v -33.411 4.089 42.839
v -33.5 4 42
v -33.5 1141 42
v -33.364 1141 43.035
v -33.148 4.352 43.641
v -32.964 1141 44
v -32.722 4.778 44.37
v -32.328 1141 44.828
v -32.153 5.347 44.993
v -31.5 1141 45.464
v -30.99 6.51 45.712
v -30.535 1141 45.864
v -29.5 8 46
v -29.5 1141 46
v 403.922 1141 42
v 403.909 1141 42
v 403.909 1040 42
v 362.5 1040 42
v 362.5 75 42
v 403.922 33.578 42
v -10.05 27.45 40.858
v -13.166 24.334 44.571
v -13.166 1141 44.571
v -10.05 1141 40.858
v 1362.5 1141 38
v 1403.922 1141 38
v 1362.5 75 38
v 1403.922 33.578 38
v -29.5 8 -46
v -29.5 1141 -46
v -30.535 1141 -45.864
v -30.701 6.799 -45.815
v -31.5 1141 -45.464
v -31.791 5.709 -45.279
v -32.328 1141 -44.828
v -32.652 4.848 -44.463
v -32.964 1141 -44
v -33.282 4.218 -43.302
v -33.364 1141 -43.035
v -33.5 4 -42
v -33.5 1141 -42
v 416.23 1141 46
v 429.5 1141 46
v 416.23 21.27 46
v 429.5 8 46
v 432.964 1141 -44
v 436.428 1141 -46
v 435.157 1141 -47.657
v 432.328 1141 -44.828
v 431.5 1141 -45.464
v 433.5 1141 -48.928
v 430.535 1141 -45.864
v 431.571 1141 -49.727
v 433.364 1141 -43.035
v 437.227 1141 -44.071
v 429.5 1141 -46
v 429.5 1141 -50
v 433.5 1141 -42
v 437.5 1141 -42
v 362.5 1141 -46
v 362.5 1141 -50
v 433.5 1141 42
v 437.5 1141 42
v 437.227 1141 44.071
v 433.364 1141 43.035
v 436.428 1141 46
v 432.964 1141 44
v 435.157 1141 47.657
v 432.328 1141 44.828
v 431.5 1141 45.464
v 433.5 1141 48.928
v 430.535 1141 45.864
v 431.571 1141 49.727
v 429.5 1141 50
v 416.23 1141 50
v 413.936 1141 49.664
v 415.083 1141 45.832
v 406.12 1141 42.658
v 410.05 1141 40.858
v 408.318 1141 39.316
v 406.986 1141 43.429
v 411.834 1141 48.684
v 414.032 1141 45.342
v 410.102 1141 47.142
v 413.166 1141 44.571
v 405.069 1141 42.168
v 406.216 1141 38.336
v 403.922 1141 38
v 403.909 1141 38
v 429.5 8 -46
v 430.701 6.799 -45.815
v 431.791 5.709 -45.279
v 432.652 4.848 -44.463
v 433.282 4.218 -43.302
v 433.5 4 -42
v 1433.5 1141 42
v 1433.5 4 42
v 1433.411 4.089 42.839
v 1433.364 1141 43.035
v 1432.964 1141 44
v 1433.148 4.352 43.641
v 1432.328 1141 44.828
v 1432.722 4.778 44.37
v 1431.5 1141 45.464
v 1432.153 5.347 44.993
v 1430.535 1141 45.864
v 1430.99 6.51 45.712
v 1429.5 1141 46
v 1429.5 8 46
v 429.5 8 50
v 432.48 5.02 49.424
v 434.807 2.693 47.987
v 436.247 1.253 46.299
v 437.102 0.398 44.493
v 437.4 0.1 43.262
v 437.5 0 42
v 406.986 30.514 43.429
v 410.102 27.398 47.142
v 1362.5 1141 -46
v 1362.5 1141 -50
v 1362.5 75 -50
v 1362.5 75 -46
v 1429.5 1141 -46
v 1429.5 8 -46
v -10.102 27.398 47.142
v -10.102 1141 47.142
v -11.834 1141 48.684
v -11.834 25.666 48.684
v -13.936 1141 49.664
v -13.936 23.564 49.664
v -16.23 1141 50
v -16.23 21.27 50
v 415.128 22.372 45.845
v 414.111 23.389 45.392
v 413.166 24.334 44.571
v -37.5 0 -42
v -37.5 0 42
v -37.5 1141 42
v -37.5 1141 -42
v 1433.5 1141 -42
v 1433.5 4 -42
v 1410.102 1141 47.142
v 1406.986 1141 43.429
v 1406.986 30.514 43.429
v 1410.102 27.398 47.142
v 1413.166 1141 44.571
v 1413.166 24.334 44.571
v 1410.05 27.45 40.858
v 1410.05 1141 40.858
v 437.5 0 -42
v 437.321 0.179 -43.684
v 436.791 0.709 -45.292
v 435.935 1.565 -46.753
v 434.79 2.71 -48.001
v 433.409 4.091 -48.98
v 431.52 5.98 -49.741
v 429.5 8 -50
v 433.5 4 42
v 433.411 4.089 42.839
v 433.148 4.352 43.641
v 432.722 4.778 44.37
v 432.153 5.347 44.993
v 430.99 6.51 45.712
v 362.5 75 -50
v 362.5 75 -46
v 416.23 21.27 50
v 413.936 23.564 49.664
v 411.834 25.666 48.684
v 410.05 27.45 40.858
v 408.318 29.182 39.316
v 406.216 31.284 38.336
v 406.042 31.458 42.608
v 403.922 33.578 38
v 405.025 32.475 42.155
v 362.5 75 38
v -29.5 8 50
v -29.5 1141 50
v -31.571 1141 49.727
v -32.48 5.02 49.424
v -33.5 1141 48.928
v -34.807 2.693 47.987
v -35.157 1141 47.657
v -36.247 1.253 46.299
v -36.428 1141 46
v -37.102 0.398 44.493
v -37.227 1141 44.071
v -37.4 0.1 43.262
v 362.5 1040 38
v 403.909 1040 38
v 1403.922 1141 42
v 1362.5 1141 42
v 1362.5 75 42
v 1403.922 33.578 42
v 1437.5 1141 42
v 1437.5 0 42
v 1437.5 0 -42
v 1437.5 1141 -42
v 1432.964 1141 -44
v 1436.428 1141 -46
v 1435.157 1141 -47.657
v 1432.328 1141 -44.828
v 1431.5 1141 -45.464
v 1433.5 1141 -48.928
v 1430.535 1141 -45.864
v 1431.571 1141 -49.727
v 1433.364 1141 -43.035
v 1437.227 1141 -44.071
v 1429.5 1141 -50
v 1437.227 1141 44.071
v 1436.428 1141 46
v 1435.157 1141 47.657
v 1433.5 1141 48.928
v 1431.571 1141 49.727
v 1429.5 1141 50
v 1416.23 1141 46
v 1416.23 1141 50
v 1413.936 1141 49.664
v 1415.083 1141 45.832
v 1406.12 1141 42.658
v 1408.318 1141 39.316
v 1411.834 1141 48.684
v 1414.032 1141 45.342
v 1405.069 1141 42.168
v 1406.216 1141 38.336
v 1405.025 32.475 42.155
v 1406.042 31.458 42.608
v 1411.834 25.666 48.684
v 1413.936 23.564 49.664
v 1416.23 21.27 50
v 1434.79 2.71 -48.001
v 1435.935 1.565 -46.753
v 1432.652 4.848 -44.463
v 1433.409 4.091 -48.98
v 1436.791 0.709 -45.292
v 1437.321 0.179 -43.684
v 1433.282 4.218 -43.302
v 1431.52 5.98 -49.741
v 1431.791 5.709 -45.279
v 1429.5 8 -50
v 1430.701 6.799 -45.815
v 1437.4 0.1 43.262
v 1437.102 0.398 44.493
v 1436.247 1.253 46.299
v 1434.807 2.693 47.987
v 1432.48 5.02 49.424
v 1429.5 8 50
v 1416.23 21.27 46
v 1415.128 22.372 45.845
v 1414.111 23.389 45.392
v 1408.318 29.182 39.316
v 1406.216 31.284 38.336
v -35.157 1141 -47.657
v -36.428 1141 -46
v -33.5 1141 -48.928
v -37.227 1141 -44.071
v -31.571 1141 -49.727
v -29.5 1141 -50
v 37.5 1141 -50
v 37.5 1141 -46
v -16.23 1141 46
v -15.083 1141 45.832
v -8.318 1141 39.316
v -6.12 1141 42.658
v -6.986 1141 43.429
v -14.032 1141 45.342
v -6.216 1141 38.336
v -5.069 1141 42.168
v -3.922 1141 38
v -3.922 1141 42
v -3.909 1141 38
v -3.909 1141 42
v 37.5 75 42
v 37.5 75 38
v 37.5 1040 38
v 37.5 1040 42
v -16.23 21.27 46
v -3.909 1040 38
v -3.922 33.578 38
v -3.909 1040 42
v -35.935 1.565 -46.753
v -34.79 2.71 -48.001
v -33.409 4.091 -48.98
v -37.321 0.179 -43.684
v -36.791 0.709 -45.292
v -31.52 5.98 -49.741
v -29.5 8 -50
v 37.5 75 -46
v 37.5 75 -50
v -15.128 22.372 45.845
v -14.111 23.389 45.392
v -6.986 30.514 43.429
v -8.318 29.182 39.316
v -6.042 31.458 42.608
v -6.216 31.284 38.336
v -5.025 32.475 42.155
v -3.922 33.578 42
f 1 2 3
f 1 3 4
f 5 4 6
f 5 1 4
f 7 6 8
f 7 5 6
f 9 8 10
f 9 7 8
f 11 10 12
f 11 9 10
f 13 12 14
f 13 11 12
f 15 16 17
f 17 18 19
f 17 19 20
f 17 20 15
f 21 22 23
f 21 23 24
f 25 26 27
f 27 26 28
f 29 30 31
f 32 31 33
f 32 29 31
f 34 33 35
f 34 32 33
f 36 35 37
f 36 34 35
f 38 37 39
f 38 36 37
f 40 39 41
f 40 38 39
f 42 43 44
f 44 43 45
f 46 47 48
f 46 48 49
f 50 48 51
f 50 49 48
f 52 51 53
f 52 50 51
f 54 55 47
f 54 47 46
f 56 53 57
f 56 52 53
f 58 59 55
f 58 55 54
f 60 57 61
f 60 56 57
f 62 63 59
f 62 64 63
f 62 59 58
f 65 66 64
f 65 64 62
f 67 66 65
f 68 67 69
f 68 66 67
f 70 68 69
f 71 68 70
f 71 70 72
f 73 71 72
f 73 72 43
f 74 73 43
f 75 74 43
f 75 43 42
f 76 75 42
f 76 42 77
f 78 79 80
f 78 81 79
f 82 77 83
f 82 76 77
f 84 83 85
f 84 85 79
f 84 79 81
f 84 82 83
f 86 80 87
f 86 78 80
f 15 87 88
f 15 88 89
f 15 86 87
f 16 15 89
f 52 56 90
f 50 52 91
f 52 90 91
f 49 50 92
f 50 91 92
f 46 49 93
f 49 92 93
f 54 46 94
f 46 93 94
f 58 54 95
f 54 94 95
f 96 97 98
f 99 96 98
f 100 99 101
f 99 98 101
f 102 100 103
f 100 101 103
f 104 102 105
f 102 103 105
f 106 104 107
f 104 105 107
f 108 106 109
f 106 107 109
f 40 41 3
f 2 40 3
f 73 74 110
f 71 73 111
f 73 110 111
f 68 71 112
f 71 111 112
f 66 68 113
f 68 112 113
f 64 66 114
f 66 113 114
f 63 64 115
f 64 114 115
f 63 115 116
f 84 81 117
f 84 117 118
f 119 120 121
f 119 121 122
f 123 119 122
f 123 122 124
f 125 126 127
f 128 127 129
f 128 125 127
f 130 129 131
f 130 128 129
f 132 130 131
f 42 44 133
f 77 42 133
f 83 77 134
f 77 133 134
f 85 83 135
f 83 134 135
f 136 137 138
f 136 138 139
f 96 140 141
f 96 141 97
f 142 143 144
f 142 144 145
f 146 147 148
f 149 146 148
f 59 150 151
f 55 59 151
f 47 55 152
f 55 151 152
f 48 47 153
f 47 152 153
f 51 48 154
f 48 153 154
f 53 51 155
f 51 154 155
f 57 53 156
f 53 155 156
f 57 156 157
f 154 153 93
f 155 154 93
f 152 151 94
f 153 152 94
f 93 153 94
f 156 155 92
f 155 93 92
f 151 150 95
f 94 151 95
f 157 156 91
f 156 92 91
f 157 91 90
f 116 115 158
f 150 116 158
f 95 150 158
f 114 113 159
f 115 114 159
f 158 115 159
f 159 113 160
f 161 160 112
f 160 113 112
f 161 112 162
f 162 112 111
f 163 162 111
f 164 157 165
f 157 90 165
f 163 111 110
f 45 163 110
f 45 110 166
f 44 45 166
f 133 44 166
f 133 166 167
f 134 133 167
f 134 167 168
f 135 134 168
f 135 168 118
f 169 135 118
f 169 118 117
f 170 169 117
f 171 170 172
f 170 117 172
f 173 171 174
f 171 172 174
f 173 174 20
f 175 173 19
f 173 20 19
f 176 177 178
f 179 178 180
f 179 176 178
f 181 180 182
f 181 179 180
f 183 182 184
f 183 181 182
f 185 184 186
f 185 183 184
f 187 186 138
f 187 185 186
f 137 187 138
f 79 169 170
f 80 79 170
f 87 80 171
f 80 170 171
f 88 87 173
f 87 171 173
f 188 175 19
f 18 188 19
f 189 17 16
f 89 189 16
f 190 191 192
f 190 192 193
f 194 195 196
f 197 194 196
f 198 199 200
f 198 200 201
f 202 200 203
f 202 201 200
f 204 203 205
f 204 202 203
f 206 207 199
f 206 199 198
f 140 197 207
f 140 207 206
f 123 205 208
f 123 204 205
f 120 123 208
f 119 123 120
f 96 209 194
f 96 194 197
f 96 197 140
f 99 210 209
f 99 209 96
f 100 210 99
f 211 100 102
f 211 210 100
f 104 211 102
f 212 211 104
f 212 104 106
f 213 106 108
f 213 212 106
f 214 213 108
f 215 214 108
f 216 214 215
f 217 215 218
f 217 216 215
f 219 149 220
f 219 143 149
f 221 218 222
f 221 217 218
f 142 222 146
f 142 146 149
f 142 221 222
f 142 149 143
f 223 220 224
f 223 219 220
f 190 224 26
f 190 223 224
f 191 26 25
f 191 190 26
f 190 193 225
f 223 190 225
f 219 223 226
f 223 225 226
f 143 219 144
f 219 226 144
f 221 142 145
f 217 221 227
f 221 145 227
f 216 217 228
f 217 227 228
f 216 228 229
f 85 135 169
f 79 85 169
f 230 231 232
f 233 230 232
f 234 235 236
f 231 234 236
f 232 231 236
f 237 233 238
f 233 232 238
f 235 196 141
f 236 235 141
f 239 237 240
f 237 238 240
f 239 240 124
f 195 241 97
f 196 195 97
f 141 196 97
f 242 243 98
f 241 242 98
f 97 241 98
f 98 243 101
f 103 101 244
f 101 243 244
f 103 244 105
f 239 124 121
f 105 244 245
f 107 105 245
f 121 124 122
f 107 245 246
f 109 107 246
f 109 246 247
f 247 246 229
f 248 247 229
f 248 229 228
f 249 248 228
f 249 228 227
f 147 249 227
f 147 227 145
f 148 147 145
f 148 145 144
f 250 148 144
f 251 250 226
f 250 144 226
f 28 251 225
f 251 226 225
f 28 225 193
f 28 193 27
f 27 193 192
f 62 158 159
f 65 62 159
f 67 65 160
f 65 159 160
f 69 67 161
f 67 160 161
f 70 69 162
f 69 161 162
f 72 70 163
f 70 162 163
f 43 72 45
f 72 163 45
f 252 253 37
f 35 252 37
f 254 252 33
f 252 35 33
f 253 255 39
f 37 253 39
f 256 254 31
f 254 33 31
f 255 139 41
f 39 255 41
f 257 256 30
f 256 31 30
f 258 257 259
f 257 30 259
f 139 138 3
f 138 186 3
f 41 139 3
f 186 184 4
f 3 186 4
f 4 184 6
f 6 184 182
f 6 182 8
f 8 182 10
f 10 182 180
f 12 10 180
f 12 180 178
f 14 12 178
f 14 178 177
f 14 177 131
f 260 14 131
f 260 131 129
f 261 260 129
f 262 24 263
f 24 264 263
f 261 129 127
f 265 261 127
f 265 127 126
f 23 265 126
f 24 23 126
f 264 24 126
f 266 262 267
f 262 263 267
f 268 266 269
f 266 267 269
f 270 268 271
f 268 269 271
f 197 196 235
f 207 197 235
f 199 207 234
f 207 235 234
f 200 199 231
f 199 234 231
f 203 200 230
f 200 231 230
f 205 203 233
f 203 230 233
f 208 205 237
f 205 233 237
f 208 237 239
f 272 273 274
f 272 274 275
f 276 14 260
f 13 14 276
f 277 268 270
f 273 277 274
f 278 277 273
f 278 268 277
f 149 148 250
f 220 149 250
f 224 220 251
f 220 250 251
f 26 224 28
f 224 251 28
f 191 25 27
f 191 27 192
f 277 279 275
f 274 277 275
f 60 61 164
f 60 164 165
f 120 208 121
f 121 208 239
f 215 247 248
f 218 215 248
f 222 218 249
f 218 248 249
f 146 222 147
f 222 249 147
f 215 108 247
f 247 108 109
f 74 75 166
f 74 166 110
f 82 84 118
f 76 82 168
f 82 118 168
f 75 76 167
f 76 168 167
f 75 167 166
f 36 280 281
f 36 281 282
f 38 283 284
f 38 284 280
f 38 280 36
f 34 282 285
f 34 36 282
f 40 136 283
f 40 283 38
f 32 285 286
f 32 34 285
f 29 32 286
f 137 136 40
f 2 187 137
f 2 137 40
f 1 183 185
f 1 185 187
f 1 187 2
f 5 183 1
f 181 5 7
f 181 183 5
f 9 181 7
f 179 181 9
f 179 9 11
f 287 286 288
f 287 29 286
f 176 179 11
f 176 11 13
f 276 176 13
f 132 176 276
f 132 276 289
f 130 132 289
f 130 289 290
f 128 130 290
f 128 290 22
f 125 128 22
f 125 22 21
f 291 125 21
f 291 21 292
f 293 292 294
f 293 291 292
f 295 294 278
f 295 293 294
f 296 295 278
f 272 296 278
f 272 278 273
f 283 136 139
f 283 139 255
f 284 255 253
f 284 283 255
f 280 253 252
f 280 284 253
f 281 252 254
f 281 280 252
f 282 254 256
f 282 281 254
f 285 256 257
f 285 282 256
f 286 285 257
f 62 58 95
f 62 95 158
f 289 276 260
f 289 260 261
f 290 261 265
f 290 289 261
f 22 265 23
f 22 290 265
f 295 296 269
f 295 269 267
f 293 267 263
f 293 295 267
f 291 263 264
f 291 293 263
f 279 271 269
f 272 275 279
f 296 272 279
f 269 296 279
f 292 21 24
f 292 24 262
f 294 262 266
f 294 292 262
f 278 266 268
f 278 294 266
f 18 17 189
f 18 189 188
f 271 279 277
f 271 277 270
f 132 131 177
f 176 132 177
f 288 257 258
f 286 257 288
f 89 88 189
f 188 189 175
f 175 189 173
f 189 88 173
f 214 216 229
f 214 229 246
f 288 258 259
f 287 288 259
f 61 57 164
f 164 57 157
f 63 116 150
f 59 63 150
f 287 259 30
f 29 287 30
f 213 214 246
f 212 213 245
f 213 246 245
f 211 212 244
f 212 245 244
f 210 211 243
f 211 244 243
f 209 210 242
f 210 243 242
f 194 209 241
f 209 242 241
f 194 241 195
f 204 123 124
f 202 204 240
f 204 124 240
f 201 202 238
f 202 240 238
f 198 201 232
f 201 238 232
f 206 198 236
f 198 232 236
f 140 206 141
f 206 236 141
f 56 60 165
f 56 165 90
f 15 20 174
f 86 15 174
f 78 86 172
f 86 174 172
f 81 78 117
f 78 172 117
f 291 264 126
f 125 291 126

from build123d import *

# Parameters (mm, degrees)
F1_DEPTH  = 1141
F4_W      = 350
F4_H      = 150
F5_DEPTH  = 150
F11_W     = 41.409
F11_H     = 101
F12_DEPTH = 4


with BuildPart() as f1:
    # F0 (on Front) → F1 (new body)
    with BuildSketch(Plane.XZ):
        with BuildLine():
            ThreePointArc((-37.5, -42), (-35.1568542495, -47.6568542495), (-29.5, -50))
            Line((-29.5, -50), (37.5, -50))
            Line((37.5, -50), (37.5, -46))
            Line((37.5, -46), (-29.5, -46))
            ThreePointArc((-29.5, -46), (-32.3284271247, -44.8284271247), (-33.5, -42))
            Line((-33.5, -42), (-33.5, 42))
            ThreePointArc((-33.5, 42), (-32.3284271247, 44.8284271247), (-29.5, 46))
            Line((-29.5, 46), (-16.2304612652, 46))
            ThreePointArc((-16.2304612652, 46), (-14.5399882183, 45.6252311481), (-13.1662834928, 44.5711504387))
            Line((-13.1662834928, 44.5711504387), (-10.0503278629, 40.8576991225))
            ThreePointArc((-10.0503278629, 40.8576991225), (-7.3029184119, 38.7495377037), (-3.921972318, 38))
            Line((-3.921972318, 38), (37.5, 38))
            Line((37.5, 38), (37.5, 42))
            Line((37.5, 42), (-3.921972318, 42))
            ThreePointArc((-3.921972318, 42), (-5.6124453649, 42.3747688519), (-6.9861500904, 43.4288495613))
            Line((-6.9861500904, 43.4288495613), (-10.1021057203, 47.1423008775))
            ThreePointArc((-10.1021057203, 47.1423008775), (-12.8495151713, 49.2504622963), (-16.2304612652, 50))
            Line((-16.2304612652, 50), (-29.5, 50))
            ThreePointArc((-29.5, 50), (-35.1568542495, 47.6568542495), (-37.5, 42))
            Line((-37.5, 42), (-37.5, -42))
        make_face()
    extrude(amount=-F1_DEPTH)

    # F4 (on face) → F5 (cut)
    with BuildSketch(Plane(origin=(-18.75, 18.75, 0), x_dir=(0.7071067812, 0.7071067812, 0), z_dir=(0.7071067812, -0.7071067812, 0))):
        Rectangle(F4_W, F4_H)
    extrude(amount=F5_DEPTH, mode=Mode.SUBTRACT)


with BuildPart() as f7_1:
    # F7: instance of F1
    add(f1.part.mirror(Plane.YZ.offset(200)))

    # F8: F1 across plane
    add(f1.part.mirror(Plane.YZ.offset(200)))

    # F13: F1 across plane


with BuildPart() as f10_1:
    # F10: instance of F1
    add(f1.part.mirror(Plane.YZ.offset(700)))


with BuildPart() as f1_1:
    add(f1.part)

    # F11 (on face) → F12 (cut)
    with BuildSketch(Plane.XY.offset(42)):
        with Locations((16.7955, 1090.5)):
            Rectangle(F11_W, F11_H)
    extrude(amount=-F12_DEPTH, mode=Mode.SUBTRACT)


with BuildPart() as f7_1_1:
    add(f7_1.part)
    add(f1_1.part.mirror(Plane.YZ.offset(200)), mode=Mode.INTERSECT)


solid = Compound([f10_1.part, f1_1.part, f7_1_1.part])
